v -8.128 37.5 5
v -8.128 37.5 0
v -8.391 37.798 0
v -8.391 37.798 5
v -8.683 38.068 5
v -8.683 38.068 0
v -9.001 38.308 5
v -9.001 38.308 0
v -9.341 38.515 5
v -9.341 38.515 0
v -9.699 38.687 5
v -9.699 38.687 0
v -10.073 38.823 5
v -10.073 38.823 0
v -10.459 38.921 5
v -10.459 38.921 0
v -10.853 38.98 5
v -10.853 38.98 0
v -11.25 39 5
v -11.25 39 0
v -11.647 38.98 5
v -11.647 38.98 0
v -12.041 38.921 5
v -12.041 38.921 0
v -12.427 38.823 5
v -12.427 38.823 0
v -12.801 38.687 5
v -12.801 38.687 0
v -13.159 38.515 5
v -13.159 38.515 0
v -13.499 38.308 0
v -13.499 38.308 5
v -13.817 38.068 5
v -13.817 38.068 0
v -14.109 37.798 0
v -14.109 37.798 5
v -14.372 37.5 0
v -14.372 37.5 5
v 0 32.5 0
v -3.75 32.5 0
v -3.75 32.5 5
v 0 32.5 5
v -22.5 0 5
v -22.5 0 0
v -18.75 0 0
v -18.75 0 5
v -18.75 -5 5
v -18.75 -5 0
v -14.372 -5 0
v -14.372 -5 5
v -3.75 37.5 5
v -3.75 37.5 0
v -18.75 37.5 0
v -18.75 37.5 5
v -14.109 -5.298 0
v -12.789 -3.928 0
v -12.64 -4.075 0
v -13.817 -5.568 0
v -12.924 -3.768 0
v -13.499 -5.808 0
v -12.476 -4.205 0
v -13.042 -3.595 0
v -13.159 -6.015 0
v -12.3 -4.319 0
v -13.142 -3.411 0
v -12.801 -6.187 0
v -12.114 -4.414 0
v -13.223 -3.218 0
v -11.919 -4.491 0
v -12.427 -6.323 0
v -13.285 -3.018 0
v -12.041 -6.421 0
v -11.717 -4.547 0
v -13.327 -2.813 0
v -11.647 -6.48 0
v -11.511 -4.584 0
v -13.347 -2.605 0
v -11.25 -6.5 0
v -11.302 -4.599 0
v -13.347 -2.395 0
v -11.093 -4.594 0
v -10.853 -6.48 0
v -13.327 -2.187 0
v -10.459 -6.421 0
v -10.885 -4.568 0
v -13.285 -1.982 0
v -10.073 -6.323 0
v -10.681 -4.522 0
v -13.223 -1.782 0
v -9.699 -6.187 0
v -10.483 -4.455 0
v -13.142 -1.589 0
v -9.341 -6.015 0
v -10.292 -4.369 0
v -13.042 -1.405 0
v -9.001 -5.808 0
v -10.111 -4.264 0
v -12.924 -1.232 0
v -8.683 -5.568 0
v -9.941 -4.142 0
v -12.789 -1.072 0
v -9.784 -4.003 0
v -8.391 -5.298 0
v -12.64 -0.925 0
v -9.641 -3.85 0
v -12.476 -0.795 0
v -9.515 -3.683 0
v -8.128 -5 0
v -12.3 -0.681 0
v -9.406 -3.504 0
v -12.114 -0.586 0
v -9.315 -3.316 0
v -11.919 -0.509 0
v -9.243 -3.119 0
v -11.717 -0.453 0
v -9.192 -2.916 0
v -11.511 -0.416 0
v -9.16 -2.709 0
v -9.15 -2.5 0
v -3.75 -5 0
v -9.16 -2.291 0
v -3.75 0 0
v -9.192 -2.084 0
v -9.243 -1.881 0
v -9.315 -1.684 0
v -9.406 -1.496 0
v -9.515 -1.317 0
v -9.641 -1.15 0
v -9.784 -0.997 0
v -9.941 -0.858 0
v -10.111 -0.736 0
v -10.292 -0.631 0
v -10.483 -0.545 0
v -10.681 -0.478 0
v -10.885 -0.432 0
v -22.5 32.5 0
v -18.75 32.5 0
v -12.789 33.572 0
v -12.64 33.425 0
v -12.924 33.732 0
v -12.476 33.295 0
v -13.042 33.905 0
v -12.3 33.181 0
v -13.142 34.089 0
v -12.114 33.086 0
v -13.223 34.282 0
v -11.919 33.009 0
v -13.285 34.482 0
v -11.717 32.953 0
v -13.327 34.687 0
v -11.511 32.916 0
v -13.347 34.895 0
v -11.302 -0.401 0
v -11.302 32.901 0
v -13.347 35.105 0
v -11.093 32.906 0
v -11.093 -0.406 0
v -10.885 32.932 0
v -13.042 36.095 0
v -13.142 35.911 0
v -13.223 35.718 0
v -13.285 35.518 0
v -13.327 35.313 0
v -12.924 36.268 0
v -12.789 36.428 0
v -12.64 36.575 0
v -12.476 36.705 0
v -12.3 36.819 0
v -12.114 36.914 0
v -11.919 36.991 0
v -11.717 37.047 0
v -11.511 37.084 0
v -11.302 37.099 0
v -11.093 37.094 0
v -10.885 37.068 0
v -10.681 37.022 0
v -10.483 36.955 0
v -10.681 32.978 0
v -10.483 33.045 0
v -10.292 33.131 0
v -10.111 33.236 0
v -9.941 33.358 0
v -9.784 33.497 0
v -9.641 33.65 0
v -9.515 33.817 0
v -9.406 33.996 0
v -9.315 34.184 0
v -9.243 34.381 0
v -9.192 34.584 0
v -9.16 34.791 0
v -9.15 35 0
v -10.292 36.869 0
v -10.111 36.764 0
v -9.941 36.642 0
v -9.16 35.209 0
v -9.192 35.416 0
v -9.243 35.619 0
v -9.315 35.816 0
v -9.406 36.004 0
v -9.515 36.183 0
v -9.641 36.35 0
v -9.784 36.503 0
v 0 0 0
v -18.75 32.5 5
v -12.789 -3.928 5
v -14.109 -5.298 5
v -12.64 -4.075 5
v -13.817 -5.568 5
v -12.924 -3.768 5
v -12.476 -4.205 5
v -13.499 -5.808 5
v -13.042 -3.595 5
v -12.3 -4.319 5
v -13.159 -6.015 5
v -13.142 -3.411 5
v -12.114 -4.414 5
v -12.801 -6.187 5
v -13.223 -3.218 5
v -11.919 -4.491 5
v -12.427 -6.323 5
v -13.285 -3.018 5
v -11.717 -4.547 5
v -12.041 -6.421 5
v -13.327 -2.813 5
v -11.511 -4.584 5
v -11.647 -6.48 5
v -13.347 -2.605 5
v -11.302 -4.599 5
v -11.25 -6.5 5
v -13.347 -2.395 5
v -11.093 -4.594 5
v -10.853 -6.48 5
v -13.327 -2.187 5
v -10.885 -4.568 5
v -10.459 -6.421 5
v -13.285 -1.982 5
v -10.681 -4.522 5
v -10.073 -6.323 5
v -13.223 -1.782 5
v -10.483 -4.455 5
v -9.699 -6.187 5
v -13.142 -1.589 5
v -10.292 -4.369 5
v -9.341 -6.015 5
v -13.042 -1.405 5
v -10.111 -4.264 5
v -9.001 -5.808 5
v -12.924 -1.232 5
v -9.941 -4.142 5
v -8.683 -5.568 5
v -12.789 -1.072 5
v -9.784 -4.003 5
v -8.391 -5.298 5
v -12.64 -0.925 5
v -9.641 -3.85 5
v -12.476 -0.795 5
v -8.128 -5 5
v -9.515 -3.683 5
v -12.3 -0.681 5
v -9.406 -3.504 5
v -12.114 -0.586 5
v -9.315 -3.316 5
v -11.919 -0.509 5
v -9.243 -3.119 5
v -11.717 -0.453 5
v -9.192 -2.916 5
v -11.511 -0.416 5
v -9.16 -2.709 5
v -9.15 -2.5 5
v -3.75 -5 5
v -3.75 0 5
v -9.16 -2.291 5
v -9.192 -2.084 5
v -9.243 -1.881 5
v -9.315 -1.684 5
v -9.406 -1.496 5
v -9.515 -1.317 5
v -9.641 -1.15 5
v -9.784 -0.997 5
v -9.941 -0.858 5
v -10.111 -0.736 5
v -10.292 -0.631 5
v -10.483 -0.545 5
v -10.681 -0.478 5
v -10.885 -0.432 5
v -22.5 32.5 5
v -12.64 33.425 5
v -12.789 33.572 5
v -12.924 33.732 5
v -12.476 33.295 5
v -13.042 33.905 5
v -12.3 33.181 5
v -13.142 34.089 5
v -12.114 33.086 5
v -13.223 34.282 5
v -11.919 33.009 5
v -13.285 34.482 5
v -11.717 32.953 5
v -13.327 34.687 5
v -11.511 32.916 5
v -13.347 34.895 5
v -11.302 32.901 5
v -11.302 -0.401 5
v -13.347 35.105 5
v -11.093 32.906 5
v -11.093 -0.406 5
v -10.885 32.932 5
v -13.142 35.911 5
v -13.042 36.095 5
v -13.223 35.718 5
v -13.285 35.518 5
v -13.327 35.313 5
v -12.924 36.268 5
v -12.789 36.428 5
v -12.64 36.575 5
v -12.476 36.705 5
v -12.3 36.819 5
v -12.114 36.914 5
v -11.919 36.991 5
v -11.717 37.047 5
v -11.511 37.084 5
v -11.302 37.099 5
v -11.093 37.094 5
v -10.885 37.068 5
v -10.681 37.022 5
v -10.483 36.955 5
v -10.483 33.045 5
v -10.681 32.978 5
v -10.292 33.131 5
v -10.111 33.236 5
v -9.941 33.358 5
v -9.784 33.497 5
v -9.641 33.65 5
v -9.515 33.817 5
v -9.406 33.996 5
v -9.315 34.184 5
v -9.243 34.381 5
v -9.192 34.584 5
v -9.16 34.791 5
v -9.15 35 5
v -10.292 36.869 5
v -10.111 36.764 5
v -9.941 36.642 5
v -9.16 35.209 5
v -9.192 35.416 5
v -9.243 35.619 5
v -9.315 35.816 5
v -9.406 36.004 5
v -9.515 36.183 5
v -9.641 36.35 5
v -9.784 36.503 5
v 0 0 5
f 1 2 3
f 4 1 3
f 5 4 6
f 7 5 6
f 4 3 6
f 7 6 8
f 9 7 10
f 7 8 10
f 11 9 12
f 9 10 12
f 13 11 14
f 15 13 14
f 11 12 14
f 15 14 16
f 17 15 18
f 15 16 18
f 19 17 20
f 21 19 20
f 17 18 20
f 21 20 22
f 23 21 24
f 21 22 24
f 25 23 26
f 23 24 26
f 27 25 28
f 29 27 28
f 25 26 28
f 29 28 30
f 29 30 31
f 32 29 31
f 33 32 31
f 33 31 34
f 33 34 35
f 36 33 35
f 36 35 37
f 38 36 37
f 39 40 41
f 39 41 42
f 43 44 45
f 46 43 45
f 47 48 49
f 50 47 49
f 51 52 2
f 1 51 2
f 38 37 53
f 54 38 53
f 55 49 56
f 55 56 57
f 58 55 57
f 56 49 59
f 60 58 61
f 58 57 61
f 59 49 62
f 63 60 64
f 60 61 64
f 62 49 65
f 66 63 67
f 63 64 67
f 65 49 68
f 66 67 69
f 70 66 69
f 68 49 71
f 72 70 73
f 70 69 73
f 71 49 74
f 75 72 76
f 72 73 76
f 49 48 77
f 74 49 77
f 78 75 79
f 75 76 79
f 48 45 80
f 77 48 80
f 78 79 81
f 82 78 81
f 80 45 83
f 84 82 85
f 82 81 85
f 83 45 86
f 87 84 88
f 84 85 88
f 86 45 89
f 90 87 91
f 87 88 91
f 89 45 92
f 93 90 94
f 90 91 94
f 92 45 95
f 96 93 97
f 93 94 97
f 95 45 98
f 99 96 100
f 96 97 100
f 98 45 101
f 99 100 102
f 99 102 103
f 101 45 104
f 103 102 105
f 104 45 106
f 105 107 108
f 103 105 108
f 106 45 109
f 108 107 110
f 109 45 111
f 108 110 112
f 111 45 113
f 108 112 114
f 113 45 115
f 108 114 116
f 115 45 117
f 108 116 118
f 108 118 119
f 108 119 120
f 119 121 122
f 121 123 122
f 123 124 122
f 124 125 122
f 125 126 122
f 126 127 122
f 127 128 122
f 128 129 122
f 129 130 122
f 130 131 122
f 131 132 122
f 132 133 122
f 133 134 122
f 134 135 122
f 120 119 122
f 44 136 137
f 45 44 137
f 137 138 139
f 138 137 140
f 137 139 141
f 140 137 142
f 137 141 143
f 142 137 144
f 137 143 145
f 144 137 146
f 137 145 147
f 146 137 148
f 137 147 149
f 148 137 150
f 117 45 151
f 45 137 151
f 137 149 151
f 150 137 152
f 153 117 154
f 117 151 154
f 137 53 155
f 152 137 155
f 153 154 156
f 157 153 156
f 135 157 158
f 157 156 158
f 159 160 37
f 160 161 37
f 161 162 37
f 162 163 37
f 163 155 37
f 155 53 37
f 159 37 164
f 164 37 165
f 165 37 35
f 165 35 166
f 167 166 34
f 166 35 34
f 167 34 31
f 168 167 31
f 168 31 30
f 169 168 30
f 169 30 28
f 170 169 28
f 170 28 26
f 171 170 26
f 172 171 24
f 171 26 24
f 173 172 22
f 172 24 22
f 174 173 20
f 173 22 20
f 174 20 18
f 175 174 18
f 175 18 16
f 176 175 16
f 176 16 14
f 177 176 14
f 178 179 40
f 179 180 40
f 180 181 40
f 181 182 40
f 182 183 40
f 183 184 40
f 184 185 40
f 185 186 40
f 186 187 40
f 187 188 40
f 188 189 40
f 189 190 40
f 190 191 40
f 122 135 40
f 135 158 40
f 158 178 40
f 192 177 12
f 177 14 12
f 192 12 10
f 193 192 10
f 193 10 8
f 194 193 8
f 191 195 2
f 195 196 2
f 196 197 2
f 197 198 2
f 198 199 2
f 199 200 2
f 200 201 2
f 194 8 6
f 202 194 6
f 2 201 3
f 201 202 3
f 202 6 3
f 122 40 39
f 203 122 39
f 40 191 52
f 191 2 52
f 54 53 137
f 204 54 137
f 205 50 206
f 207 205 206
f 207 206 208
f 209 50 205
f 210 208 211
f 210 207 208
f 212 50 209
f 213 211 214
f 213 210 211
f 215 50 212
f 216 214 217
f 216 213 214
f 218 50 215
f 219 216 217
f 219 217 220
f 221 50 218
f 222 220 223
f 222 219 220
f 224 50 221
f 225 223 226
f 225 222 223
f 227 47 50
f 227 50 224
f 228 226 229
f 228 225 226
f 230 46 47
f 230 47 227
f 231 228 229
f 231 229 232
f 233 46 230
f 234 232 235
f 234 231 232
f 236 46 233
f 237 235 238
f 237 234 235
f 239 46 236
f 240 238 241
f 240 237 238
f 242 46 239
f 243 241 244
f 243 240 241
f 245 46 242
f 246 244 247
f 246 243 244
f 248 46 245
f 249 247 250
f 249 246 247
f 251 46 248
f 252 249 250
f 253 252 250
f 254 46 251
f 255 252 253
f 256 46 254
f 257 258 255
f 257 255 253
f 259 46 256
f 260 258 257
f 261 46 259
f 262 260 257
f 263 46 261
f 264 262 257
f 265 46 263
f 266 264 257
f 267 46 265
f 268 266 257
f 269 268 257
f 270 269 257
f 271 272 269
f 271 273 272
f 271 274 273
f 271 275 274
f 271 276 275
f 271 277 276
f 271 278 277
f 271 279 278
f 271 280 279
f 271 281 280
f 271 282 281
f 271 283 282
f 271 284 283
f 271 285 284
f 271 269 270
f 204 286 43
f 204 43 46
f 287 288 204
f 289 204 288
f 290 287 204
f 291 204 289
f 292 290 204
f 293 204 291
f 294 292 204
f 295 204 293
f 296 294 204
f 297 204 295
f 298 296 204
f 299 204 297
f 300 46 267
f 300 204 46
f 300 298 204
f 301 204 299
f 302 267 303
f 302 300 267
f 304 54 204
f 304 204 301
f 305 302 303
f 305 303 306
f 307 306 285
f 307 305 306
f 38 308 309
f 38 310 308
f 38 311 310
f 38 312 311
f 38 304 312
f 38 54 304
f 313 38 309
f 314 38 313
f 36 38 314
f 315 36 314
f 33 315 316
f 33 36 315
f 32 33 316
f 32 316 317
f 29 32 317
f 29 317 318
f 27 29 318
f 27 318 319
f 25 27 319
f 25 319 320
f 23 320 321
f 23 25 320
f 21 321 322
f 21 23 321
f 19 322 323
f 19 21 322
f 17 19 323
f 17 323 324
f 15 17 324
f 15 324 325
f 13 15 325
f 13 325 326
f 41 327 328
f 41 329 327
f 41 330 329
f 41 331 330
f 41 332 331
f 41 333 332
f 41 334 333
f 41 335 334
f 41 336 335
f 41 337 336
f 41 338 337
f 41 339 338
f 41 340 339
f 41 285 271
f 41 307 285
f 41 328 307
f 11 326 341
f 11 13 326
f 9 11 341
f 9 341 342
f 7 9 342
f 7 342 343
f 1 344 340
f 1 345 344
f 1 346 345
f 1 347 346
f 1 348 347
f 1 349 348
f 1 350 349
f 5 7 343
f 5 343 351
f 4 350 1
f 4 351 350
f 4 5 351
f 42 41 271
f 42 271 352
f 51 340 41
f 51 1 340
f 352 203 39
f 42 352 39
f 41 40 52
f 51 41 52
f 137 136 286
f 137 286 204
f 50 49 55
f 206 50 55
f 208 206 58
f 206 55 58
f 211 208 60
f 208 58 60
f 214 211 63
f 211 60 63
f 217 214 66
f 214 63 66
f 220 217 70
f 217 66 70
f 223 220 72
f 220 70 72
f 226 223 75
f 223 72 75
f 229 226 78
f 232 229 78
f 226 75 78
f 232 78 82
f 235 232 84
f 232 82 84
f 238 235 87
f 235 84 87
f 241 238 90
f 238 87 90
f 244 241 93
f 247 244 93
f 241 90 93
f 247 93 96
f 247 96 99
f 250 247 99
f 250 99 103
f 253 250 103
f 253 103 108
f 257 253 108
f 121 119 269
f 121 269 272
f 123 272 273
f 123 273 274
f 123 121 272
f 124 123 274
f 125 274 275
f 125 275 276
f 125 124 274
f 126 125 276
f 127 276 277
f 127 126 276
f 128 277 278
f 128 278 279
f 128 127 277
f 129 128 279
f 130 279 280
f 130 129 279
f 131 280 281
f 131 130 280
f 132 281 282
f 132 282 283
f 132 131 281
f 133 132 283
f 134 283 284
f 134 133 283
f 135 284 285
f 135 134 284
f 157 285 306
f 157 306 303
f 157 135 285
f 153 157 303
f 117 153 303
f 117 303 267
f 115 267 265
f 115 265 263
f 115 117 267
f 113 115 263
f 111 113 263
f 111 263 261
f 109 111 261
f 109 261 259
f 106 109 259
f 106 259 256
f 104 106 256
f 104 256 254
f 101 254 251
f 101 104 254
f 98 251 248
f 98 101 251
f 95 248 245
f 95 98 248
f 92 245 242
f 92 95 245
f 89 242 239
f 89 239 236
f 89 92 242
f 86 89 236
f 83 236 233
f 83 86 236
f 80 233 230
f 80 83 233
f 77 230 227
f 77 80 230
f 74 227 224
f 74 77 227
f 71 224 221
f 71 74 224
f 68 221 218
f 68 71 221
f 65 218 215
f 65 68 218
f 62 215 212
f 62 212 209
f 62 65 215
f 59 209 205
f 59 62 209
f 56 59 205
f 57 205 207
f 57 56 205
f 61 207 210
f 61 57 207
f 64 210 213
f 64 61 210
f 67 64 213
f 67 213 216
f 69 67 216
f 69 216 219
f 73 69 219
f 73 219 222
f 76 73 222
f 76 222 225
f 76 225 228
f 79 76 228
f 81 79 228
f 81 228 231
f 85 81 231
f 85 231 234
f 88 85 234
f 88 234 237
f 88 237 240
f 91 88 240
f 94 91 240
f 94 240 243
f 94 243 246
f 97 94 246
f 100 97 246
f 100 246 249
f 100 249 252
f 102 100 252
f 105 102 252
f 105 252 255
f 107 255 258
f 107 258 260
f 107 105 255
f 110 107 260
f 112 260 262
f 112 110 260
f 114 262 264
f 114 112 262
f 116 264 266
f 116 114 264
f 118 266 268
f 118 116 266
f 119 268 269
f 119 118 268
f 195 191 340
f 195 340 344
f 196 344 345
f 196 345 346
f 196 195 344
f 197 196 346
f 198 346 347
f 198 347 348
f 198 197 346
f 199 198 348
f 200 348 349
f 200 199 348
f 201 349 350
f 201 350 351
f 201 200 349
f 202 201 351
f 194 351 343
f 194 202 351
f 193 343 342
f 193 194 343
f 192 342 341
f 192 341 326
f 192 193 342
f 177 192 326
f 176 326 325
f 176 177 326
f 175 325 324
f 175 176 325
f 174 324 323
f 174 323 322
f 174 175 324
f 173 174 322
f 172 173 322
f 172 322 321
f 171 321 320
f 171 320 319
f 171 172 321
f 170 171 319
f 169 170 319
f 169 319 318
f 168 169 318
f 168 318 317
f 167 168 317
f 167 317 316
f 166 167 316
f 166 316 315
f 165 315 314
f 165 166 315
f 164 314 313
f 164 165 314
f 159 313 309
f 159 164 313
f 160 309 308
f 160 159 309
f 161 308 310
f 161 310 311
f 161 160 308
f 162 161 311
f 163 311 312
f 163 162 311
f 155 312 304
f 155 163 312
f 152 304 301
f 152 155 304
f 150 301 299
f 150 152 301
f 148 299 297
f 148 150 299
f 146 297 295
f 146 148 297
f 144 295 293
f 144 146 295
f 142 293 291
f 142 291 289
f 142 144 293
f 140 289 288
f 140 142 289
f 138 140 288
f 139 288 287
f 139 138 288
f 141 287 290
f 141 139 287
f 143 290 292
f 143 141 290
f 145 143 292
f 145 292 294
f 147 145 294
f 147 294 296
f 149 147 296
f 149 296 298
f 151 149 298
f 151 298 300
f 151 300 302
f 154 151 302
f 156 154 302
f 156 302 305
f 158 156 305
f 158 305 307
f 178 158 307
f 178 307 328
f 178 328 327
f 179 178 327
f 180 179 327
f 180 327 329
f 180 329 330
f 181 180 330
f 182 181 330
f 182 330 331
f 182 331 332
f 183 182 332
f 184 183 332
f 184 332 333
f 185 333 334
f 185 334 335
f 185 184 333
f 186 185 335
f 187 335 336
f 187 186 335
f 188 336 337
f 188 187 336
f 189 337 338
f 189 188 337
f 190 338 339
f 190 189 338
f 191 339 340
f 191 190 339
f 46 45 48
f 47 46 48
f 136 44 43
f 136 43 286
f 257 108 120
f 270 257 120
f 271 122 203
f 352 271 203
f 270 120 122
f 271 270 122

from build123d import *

# Parameters (mm, degrees)
SKETCH1_R           = 2.1
SKETCH1_W           = 22.5
SKETCH1_H           = 32.5
BOSS_EXTRUDE1_DEPTH = 5


with BuildPart() as part:
    # Sketch1 → Boss-Extrude1 (new body)
    # profile 1 of 5: a face of its own
    with BuildSketch(Plane.XY):
        Polygon((-18.75, 32.5), (-3.75, 32.5), (-3.75, 37.5), (-8.127501001, 37.5), (-14.372498999, 37.5), (-18.75, 37.5), align=None)
        with Locations((-11.25, 35)):
            Circle(SKETCH1_R, mode=Mode.SUBTRACT)
    # profile 2 of 5: a face of its own
    with BuildSketch(Plane.XY):
        with Locations((-11.25, 16.25)):
            Rectangle(SKETCH1_W, SKETCH1_H)
    # profile 3 of 5: a face of its own
    with BuildSketch(Plane.XY):
        Polygon((-3.75, -5), (-3.75, 0), (-18.75, 0), (-18.75, -5), (-14.372498999, -5), (-8.127501001, -5), align=None)
        with Locations((-11.25, -2.5)):
            Circle(SKETCH1_R, mode=Mode.SUBTRACT)
    # profile 4 of 5: a face of its own
    with BuildSketch(Plane.XY):
        with BuildLine():
            ThreePointArc((-14.372498999, -5), (-11.25, -6.5), (-8.127501001, -5))
            Line((-8.127501001, -5), (-14.372498999, -5))
        make_face()
    # profile 5 of 5: a face of its own
    with BuildSketch(Plane.XY):
        with BuildLine():
            ThreePointArc((-8.127501001, 37.5), (-11.25, 39), (-14.372498999, 37.5))
            Line((-14.372498999, 37.5), (-8.127501001, 37.5))
        make_face()
    extrude(amount=BOSS_EXTRUDE1_DEPTH)


solid = part.part
